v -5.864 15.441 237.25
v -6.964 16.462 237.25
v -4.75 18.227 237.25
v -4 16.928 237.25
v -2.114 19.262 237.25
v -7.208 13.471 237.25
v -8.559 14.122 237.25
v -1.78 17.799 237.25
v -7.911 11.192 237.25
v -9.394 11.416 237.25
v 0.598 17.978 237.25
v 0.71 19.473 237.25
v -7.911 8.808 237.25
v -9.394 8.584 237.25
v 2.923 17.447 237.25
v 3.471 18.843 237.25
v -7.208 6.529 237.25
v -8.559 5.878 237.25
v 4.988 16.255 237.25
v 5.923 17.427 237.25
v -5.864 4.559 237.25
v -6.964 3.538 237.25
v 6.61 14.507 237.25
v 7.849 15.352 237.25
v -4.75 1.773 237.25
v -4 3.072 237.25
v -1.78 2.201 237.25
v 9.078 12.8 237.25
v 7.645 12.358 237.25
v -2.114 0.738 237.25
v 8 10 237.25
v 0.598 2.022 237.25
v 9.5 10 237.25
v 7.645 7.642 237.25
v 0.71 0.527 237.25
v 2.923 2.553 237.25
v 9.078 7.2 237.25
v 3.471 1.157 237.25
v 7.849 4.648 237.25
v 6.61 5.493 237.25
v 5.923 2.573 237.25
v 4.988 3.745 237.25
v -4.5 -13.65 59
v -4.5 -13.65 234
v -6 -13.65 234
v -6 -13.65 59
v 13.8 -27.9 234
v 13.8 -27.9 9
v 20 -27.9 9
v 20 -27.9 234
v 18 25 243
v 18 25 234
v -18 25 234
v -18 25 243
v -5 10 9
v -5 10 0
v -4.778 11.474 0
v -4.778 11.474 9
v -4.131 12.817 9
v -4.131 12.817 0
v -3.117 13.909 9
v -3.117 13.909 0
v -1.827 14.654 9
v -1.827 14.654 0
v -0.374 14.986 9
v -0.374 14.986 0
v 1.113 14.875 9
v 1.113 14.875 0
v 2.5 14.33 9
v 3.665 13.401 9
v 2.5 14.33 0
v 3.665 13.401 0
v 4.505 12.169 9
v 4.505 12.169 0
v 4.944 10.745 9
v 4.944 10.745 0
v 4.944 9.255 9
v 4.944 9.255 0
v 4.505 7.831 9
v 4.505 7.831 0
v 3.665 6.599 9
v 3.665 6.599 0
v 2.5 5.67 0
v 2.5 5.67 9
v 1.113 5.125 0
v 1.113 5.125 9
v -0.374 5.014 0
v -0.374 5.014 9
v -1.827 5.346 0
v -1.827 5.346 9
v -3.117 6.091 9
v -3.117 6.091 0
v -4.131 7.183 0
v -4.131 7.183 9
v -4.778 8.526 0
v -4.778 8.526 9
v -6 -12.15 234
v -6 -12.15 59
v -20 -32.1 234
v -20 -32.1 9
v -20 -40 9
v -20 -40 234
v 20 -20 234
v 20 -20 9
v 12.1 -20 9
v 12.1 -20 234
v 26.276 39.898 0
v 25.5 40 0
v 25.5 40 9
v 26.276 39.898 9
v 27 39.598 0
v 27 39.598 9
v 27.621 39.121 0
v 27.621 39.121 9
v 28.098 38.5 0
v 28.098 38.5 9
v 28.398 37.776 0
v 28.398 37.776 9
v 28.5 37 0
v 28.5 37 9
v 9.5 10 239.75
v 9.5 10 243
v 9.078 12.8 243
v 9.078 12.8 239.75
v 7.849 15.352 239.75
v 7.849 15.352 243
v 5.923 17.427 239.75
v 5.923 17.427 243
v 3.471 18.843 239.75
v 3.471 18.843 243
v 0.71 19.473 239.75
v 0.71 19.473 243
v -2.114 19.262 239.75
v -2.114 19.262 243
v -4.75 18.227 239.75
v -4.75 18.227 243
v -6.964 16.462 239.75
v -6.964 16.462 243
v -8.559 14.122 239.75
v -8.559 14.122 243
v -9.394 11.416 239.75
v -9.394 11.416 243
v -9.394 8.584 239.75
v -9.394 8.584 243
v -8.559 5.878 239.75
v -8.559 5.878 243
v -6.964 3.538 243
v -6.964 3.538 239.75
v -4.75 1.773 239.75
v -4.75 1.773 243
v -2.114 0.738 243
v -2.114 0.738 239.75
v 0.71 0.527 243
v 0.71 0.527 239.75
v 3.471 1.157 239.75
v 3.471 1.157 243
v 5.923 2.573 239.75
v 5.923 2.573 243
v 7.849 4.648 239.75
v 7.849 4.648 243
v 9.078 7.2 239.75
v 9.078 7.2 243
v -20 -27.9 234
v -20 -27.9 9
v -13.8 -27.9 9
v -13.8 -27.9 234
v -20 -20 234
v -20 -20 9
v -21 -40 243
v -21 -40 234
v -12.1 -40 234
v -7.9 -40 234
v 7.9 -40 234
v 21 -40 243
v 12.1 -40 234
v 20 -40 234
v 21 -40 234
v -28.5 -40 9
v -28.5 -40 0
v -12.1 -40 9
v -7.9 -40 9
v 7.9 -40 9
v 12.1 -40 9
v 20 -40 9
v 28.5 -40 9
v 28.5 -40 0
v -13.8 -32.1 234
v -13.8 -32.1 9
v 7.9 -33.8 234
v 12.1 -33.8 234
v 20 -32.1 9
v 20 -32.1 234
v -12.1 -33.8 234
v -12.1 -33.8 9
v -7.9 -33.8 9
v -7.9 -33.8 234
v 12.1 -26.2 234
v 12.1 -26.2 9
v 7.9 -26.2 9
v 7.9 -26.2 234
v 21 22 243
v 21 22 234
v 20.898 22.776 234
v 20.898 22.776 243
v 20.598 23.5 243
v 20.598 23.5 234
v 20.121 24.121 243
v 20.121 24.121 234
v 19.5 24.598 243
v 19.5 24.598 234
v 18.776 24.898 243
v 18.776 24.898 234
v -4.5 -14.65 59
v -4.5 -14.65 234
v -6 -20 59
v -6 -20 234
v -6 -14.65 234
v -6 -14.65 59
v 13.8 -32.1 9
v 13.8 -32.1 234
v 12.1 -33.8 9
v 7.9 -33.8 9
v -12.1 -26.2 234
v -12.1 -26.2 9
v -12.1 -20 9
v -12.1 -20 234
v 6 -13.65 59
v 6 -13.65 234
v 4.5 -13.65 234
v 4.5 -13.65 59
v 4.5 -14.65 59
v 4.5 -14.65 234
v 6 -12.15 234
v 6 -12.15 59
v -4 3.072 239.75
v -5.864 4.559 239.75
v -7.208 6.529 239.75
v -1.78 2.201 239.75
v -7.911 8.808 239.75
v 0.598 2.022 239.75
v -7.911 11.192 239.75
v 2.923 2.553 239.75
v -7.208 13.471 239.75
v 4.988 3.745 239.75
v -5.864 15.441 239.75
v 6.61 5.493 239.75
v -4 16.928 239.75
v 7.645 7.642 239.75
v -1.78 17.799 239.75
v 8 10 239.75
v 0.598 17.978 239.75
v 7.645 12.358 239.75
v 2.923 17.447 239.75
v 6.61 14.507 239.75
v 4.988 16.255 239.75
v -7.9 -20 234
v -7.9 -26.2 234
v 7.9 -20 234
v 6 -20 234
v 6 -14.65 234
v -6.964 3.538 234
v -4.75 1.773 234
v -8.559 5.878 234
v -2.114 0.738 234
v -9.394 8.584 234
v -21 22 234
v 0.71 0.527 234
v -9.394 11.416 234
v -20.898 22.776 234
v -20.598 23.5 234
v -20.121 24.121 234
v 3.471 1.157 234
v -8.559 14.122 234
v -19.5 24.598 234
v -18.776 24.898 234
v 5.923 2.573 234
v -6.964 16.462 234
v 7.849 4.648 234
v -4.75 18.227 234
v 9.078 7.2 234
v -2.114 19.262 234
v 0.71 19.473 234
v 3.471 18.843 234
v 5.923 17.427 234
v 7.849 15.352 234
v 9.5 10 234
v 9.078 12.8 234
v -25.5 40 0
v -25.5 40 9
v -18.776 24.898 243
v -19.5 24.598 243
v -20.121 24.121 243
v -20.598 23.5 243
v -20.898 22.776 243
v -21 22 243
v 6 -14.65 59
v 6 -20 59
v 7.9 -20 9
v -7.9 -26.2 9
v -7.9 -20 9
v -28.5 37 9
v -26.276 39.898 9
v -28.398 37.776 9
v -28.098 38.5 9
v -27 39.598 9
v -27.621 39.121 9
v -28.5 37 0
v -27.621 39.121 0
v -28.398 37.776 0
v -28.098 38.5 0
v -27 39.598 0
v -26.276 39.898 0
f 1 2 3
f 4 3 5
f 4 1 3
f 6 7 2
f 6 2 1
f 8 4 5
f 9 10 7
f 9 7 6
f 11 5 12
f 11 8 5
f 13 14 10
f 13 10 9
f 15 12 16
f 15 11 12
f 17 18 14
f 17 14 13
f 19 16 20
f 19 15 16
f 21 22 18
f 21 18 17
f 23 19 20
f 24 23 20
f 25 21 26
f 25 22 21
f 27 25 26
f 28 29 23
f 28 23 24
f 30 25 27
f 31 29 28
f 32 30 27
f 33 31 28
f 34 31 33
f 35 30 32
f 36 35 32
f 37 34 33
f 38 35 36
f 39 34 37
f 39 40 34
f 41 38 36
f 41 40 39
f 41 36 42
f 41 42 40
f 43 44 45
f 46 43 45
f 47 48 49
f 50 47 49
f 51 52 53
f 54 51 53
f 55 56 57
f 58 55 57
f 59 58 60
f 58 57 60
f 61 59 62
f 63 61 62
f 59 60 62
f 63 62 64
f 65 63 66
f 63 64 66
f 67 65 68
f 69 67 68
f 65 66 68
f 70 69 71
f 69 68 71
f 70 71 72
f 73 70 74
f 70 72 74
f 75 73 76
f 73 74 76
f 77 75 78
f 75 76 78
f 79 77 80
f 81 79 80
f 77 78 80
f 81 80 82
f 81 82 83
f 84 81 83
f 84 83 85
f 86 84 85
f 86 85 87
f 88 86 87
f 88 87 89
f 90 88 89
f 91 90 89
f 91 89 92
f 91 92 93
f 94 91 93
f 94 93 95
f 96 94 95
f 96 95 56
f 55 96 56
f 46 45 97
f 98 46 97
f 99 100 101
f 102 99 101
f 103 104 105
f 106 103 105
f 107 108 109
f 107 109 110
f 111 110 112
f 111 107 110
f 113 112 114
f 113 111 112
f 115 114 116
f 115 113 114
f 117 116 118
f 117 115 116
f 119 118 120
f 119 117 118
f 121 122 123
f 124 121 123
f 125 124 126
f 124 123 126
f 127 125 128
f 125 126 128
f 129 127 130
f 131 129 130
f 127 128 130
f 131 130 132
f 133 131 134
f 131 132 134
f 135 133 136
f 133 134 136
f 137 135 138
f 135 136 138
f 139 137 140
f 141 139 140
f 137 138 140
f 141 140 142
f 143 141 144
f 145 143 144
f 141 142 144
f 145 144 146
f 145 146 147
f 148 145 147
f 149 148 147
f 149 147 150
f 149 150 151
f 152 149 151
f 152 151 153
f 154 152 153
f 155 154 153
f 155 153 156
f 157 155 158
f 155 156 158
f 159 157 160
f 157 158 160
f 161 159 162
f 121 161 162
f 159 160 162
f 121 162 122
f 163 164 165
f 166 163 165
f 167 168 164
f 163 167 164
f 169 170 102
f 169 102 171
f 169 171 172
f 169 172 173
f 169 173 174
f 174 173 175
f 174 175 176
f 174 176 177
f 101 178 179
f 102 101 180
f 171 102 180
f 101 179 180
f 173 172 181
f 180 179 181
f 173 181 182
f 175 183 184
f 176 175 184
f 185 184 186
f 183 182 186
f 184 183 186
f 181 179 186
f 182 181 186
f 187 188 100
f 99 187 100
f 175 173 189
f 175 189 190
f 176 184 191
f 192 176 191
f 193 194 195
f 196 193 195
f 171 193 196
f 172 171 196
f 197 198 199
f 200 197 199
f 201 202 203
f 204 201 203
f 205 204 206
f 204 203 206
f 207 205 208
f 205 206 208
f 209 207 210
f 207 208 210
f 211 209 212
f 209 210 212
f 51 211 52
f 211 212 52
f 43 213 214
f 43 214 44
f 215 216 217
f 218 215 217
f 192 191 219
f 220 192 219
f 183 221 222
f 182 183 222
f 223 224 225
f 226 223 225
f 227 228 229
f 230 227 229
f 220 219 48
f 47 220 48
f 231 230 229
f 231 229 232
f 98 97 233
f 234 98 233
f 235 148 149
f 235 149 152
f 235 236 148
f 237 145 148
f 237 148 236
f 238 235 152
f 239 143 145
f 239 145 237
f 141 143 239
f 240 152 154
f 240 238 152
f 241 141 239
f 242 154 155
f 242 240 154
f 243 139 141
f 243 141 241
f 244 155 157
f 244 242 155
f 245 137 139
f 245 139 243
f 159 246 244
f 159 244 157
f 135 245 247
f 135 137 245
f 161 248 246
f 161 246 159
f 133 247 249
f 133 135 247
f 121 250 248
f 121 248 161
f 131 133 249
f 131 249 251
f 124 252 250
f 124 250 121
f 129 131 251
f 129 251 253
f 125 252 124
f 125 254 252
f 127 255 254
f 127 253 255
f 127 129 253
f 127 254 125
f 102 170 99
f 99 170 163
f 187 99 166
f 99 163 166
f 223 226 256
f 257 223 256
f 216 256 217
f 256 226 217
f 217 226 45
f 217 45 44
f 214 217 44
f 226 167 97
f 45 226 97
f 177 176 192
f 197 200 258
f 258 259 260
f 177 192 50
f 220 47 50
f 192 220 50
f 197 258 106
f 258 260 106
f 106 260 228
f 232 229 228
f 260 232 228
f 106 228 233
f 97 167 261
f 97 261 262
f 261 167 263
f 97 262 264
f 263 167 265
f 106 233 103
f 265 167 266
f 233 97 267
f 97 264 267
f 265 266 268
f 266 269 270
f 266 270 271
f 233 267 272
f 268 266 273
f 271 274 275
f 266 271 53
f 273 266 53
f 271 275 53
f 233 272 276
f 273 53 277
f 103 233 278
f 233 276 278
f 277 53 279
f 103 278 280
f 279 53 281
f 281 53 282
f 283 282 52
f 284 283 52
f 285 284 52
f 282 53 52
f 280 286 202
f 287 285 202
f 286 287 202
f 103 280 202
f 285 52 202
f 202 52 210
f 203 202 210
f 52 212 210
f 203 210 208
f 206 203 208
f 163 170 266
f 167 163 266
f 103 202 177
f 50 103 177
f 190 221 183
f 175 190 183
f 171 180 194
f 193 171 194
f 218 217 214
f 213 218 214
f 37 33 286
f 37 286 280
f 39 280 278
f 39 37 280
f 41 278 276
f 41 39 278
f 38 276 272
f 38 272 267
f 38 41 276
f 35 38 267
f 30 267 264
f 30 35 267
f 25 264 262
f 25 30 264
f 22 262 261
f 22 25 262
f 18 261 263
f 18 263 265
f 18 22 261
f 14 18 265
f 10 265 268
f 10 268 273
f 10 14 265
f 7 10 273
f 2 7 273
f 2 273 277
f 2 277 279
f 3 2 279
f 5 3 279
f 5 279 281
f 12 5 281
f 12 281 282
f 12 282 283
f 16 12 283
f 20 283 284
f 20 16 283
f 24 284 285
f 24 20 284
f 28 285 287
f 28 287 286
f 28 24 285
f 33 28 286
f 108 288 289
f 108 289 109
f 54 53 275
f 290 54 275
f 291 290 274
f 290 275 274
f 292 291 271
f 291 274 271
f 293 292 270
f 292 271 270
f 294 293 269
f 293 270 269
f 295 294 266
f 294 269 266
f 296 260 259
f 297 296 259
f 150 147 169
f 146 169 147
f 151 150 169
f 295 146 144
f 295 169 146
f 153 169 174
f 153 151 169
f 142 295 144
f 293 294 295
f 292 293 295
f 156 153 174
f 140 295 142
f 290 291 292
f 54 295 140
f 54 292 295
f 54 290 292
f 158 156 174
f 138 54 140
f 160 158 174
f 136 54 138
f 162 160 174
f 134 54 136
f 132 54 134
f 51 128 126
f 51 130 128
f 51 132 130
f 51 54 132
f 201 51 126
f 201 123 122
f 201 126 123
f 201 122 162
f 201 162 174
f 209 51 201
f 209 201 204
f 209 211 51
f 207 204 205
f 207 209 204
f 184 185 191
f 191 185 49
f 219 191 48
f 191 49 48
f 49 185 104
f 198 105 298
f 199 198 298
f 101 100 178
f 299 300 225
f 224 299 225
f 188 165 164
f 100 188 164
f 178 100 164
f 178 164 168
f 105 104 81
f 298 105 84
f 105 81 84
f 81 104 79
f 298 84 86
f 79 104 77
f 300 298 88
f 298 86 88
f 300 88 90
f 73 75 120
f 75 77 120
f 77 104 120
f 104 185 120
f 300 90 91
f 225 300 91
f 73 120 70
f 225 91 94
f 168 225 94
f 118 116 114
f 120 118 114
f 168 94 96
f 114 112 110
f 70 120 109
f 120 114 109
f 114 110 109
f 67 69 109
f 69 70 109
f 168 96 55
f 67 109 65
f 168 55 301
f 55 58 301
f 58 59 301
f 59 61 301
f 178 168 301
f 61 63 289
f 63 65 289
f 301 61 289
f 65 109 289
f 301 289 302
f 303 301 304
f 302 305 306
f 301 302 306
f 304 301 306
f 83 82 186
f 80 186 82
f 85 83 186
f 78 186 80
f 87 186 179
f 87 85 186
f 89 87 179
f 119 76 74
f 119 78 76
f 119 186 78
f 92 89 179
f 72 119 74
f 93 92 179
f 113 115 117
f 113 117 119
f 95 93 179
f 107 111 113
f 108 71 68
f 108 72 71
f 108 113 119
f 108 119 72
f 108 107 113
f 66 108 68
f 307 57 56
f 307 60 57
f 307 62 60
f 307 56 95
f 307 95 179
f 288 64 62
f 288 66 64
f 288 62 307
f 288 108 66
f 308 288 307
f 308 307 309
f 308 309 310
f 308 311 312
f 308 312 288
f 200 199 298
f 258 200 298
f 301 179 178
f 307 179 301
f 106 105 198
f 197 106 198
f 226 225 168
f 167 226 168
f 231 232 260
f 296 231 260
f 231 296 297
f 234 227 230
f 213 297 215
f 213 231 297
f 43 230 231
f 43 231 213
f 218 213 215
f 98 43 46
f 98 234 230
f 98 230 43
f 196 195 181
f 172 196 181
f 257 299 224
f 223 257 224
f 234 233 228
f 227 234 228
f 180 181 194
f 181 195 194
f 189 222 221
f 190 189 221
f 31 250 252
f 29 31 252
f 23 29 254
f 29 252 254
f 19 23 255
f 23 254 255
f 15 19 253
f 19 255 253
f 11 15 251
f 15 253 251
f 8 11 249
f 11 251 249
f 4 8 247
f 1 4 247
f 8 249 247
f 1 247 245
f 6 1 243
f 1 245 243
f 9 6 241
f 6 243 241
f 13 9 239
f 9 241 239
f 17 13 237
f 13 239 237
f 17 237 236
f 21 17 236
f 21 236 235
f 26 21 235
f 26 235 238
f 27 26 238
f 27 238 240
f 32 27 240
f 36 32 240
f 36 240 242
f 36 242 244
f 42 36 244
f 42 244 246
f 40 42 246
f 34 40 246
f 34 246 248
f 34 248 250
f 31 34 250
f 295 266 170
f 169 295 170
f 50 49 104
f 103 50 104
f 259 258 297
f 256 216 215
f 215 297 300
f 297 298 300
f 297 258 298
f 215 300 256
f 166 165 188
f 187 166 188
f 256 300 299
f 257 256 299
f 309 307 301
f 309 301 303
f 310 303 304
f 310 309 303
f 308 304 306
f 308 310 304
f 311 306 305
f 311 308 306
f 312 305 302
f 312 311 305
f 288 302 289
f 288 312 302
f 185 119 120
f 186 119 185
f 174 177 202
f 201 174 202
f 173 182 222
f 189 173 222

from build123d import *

# Parameters (mm, degrees)
EXTRUDE_1_DEPTH     = 9
EXTRUDE_2_DEPTH     = 225
EXTRUDE_3_DEPTH     = 9
SKETCH_6_R          = 9.5
CUT_EXTRUDE_3_DEPTH = 3.25
CUT_EXTRUDE_START   = -3.25
SKETCH_7_R          = 9.5
CUT_EXTRUDE_4_DEPTH = 3.25
EXTRUDE_4_DEPTH     = 175
CUT_EXTRUDE_5_REACH = 246.729
SKETCH_10_R         = 8
SKETCH_11_R         = 5
CUT_EXTRUDE_6_DEPTH = 10


with BuildPart() as part:
    # 草图1 → 凸台-拉伸1 (new body)
    with BuildSketch(Plane.XY):
        with BuildLine():
            Line((-25.5, 40), (25.5, 40))
            ThreePointArc((25.5, 40), (27.621320344, 39.121320344), (28.5, 37))
            Line((28.5, 37), (28.5, -40))
            Line((28.5, -40), (-28.5, -40))
            Line((-28.5, -40), (-28.5, 37))
            ThreePointArc((-28.5, 37), (-27.621320344, 39.121320344), (-25.5, 40))
        make_face()
    extrude(amount=EXTRUDE_1_DEPTH)

    # 草图2 → 凸台-拉伸2 (add)
    with BuildSketch(Plane.XY.offset(9)):
        Polygon((-20, -40), (-12.1, -40), (-12.1, -33.8), (-7.9, -33.8), (-7.9, -40), (7.9, -40), (7.9, -33.8), (12.1, -33.8), (12.1, -40), (20, -40), (20, -32.1), (13.8, -32.1), (13.8, -27.9), (20, -27.9), (20, -20), (12.1, -20), (12.1, -26.2), (7.9, -26.2), (7.9, -20), (-7.9, -20), (-7.9, -26.2), (-12.1, -26.2), (-12.1, -20), (-20, -20), (-20, -27.9), (-13.8, -27.9), (-13.8, -32.1), (-20, -32.1), align=None)
    extrude(amount=EXTRUDE_2_DEPTH)

    # 草图3 → 凸台-拉伸3 (add)
    with BuildSketch(Plane.XY.offset(234)):
        with BuildLine():
            Line((-21, -40), (21, -40))
            Line((21, -40), (21, 22))
            ThreePointArc((21, 22), (20.121320344, 24.121320344), (18, 25))
            Line((18, 25), (-18, 25))
            ThreePointArc((-18, 25), (-20.121320344, 24.121320344), (-21, 22))
            Line((-21, 22), (-21, -40))
        make_face()
    extrude(amount=EXTRUDE_3_DEPTH)

    # 草图6 → 切除-拉伸3 (cut)
    with BuildSketch(Plane.XY.offset(243)):
        with Locations((0, 10)):
            Circle(SKETCH_6_R)
    extrude(amount=-CUT_EXTRUDE_3_DEPTH, mode=Mode.SUBTRACT)

    # 草图7 → 切除-拉伸4 (cut)
    with BuildSketch(Plane(origin=(0, 0, 234), x_dir=(-1, 0, 0), z_dir=(0, 0, -1)).offset(CUT_EXTRUDE_START)):
        with Locations(Location((0, 10, 0), (0, 0, 180))):
            Circle(SKETCH_7_R)
    extrude(amount=CUT_EXTRUDE_4_DEPTH, mode=Mode.SUBTRACT)

    # 草图8 → 凸台-拉伸4 (add)
    with BuildSketch(Plane(origin=(0, 0, 234), x_dir=(-1, 0, 0), z_dir=(0, 0, -1))):
        Polygon((-6, -20), (6, -20), (6, -14.65), (4.5, -14.65), (4.5, -13.65), (6, -13.65), (6, -12.15), (-6, -12.15), (-6, -13.65), (-4.5, -13.65), (-4.5, -14.65), (-6, -14.65), align=None)
    extrude(amount=EXTRUDE_4_DEPTH)

    # 草图10 → 切除-拉伸5 (cut, up to next)
    with BuildSketch(Plane.XY.offset(239.75), mode=Mode.PRIVATE) as cut_extrude_5_sk1:
        with Locations((0, 10)):
            Circle(SKETCH_10_R)
    cut_extrude_5_tool1 = extrude(cut_extrude_5_sk1.sketch, amount=-CUT_EXTRUDE_5_REACH, mode=Mode.PRIVATE) & part.part
    add(cut_extrude_5_tool1.solids().sort_by_distance((0, 10, 239.75))[0], mode=Mode.SUBTRACT)

    # 草图11 → 切除-拉伸6 (cut)
    with BuildSketch(Plane(origin=(0, 0, 0), x_dir=(-1, 0, 0), z_dir=(0, 0, -1))):
        with Locations((0, 10)):
            Circle(SKETCH_11_R)
    extrude(amount=-CUT_EXTRUDE_6_DEPTH, mode=Mode.SUBTRACT)


solid = part.part
